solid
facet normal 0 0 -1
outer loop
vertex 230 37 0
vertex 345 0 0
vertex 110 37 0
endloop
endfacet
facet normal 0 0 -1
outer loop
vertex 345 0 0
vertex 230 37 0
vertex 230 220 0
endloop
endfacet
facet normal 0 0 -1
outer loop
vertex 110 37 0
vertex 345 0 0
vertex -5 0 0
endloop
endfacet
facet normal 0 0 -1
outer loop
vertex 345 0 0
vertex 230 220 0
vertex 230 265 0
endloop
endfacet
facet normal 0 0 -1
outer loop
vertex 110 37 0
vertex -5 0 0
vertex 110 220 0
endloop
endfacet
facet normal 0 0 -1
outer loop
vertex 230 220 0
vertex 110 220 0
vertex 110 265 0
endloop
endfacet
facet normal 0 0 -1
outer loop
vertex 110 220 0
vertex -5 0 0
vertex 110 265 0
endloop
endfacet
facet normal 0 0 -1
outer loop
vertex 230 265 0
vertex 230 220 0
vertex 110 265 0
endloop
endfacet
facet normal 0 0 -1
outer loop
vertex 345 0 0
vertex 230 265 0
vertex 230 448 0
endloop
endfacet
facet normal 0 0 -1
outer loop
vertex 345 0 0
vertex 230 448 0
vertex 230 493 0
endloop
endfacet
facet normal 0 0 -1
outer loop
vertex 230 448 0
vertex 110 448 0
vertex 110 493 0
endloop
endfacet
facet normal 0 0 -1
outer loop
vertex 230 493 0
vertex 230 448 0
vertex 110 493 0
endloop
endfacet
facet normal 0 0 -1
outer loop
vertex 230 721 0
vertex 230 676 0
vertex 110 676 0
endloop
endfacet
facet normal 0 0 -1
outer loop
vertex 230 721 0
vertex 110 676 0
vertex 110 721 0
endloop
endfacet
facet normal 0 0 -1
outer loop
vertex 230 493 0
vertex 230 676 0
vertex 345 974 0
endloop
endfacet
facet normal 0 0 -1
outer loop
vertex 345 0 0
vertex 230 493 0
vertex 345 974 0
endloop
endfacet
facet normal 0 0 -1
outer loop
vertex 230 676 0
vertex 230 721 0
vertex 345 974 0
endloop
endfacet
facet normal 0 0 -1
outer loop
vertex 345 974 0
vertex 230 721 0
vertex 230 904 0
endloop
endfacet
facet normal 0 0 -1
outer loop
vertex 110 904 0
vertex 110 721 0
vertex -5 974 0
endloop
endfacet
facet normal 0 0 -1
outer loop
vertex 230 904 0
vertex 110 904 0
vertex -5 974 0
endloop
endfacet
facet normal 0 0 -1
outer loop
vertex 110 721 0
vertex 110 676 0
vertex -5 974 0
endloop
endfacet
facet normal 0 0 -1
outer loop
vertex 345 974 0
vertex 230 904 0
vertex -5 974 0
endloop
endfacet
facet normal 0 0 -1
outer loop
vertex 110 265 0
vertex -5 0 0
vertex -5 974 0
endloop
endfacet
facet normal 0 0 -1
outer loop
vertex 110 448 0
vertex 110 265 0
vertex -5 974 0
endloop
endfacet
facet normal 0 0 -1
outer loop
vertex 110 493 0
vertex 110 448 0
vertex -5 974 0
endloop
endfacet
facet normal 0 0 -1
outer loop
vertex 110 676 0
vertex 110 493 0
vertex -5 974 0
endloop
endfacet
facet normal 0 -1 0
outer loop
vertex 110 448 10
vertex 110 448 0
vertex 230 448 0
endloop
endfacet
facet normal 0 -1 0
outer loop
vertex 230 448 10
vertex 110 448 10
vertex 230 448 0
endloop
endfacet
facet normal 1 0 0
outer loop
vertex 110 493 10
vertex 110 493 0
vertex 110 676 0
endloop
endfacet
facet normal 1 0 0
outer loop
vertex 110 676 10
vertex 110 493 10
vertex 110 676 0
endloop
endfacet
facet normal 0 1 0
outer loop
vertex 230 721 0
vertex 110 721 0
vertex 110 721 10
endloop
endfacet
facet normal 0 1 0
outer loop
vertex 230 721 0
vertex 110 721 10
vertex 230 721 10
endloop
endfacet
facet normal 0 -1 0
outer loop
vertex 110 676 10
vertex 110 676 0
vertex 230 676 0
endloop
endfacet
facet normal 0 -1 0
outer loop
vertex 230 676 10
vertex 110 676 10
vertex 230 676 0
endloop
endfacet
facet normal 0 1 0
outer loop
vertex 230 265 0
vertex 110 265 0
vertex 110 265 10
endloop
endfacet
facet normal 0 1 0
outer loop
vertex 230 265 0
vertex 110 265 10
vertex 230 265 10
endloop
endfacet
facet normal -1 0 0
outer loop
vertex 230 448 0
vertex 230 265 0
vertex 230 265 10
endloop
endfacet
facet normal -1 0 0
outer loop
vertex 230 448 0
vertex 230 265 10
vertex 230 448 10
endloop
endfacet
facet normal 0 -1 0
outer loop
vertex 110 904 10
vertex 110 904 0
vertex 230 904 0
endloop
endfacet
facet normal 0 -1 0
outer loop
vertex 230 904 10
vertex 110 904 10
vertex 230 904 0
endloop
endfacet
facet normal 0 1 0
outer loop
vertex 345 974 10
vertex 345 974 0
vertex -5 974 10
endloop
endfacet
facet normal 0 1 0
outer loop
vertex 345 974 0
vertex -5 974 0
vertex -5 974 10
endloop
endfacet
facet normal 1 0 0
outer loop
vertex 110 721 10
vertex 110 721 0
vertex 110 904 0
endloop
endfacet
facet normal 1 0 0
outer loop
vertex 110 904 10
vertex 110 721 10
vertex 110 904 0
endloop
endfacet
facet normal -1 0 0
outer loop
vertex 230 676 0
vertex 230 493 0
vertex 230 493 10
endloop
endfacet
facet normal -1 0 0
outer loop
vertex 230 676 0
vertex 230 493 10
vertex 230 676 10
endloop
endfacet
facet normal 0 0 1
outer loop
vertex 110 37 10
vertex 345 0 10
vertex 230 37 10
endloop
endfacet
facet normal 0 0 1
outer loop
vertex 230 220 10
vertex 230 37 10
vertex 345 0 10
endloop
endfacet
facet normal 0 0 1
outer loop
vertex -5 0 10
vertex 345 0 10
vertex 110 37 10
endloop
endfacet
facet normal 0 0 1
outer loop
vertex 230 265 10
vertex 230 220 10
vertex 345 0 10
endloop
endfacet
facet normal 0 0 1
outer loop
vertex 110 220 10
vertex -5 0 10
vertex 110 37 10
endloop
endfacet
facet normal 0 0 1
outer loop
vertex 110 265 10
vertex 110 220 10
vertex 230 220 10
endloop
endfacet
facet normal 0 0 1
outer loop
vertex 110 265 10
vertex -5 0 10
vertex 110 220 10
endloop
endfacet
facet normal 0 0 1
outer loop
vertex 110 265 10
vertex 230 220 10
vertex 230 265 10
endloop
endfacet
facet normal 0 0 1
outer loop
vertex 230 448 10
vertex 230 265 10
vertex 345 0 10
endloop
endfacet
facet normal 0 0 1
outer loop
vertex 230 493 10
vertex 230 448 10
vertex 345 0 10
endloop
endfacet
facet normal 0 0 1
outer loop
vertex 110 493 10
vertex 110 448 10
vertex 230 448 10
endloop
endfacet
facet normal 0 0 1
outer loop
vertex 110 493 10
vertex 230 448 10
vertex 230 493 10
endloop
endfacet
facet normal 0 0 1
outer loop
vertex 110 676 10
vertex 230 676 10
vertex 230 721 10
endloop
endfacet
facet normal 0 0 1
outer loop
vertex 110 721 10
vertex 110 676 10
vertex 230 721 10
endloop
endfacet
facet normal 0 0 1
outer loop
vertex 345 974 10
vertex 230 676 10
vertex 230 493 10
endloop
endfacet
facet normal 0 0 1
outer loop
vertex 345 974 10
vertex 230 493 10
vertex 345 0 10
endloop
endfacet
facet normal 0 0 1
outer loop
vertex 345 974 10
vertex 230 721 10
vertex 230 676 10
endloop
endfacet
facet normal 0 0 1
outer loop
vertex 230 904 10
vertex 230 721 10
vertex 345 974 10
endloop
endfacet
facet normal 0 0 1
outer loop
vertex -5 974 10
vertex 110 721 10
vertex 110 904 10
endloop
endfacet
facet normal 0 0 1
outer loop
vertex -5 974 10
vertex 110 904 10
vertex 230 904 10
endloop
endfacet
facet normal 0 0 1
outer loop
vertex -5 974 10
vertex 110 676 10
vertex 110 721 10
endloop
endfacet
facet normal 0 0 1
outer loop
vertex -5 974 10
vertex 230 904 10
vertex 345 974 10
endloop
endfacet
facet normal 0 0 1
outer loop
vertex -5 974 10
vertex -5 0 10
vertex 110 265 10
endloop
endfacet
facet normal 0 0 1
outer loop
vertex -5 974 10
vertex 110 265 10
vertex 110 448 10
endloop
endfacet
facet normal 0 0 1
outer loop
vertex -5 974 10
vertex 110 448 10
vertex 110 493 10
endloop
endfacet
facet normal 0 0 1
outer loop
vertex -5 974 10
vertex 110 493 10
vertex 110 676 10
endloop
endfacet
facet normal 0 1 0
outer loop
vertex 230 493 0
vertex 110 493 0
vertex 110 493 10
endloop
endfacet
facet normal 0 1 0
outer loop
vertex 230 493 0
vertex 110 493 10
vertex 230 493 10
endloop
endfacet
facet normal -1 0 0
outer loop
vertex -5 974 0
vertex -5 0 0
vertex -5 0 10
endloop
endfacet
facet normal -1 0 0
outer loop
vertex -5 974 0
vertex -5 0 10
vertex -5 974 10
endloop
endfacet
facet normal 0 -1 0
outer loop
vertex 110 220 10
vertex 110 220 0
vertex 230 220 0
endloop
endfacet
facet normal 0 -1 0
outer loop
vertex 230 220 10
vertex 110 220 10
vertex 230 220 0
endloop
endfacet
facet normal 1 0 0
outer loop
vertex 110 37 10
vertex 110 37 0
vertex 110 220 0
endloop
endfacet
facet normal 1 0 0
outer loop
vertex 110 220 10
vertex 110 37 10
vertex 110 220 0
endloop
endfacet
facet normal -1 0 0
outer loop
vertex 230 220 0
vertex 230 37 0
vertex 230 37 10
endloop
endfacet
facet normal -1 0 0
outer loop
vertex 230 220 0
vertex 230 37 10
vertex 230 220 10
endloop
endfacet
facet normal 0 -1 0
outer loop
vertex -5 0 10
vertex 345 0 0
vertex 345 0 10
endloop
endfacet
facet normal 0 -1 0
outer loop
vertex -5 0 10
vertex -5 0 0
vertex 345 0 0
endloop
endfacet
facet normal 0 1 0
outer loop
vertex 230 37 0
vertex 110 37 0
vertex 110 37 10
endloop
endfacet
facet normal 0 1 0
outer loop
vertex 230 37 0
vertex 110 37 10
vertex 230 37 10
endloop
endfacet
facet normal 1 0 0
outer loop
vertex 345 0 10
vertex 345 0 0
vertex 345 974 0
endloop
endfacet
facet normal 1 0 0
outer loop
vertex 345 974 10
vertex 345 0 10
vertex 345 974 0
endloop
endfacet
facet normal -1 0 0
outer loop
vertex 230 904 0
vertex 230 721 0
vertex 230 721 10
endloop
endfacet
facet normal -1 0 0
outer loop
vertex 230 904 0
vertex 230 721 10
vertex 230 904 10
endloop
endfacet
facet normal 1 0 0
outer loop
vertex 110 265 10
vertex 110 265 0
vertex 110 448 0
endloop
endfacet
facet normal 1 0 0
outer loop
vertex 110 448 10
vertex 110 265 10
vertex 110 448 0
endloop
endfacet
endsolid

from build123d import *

# Parameters (mm, degrees)
SKETCH1_W           = 240
SKETCH1_H           = 974
SKETCH1_W_2         = 120
SKETCH1_H_2         = 183
BOSS_EXTRUDE1_DEPTH = 10
MOVE_FACE1_BY       = 5
MOVE_FACE2_BY       = 105


with BuildPart() as part:
    # Sketch1 → Boss-Extrude1 (new body)
    with BuildSketch(Plane.XY):
        with Locations((120, 487)):
            Rectangle(SKETCH1_W, SKETCH1_H)
        with Locations((170, 128.5)):
            Rectangle(SKETCH1_W_2, SKETCH1_H_2, mode=Mode.SUBTRACT)
        with Locations((170, 356.5)):
            Rectangle(SKETCH1_W_2, SKETCH1_H_2, mode=Mode.SUBTRACT)
        with Locations((170, 584.5)):
            Rectangle(SKETCH1_W_2, SKETCH1_H_2, mode=Mode.SUBTRACT)
        with Locations((170, 812.5)):
            Rectangle(SKETCH1_W_2, SKETCH1_H_2, mode=Mode.SUBTRACT)
    extrude(amount=BOSS_EXTRUDE1_DEPTH)

    # Move Face1: a face moved outward by 5.0
    extrude(part.faces().sort_by_distance((0, 487, 5))[0], amount=MOVE_FACE1_BY, dir=(-1, 0, 0))

    # Move Face2: a face moved outward by 105.0
    extrude(part.faces().sort_by_distance((240, 487, 5))[0], amount=MOVE_FACE2_BY, dir=(1, 0, 0))


solid = part.part
